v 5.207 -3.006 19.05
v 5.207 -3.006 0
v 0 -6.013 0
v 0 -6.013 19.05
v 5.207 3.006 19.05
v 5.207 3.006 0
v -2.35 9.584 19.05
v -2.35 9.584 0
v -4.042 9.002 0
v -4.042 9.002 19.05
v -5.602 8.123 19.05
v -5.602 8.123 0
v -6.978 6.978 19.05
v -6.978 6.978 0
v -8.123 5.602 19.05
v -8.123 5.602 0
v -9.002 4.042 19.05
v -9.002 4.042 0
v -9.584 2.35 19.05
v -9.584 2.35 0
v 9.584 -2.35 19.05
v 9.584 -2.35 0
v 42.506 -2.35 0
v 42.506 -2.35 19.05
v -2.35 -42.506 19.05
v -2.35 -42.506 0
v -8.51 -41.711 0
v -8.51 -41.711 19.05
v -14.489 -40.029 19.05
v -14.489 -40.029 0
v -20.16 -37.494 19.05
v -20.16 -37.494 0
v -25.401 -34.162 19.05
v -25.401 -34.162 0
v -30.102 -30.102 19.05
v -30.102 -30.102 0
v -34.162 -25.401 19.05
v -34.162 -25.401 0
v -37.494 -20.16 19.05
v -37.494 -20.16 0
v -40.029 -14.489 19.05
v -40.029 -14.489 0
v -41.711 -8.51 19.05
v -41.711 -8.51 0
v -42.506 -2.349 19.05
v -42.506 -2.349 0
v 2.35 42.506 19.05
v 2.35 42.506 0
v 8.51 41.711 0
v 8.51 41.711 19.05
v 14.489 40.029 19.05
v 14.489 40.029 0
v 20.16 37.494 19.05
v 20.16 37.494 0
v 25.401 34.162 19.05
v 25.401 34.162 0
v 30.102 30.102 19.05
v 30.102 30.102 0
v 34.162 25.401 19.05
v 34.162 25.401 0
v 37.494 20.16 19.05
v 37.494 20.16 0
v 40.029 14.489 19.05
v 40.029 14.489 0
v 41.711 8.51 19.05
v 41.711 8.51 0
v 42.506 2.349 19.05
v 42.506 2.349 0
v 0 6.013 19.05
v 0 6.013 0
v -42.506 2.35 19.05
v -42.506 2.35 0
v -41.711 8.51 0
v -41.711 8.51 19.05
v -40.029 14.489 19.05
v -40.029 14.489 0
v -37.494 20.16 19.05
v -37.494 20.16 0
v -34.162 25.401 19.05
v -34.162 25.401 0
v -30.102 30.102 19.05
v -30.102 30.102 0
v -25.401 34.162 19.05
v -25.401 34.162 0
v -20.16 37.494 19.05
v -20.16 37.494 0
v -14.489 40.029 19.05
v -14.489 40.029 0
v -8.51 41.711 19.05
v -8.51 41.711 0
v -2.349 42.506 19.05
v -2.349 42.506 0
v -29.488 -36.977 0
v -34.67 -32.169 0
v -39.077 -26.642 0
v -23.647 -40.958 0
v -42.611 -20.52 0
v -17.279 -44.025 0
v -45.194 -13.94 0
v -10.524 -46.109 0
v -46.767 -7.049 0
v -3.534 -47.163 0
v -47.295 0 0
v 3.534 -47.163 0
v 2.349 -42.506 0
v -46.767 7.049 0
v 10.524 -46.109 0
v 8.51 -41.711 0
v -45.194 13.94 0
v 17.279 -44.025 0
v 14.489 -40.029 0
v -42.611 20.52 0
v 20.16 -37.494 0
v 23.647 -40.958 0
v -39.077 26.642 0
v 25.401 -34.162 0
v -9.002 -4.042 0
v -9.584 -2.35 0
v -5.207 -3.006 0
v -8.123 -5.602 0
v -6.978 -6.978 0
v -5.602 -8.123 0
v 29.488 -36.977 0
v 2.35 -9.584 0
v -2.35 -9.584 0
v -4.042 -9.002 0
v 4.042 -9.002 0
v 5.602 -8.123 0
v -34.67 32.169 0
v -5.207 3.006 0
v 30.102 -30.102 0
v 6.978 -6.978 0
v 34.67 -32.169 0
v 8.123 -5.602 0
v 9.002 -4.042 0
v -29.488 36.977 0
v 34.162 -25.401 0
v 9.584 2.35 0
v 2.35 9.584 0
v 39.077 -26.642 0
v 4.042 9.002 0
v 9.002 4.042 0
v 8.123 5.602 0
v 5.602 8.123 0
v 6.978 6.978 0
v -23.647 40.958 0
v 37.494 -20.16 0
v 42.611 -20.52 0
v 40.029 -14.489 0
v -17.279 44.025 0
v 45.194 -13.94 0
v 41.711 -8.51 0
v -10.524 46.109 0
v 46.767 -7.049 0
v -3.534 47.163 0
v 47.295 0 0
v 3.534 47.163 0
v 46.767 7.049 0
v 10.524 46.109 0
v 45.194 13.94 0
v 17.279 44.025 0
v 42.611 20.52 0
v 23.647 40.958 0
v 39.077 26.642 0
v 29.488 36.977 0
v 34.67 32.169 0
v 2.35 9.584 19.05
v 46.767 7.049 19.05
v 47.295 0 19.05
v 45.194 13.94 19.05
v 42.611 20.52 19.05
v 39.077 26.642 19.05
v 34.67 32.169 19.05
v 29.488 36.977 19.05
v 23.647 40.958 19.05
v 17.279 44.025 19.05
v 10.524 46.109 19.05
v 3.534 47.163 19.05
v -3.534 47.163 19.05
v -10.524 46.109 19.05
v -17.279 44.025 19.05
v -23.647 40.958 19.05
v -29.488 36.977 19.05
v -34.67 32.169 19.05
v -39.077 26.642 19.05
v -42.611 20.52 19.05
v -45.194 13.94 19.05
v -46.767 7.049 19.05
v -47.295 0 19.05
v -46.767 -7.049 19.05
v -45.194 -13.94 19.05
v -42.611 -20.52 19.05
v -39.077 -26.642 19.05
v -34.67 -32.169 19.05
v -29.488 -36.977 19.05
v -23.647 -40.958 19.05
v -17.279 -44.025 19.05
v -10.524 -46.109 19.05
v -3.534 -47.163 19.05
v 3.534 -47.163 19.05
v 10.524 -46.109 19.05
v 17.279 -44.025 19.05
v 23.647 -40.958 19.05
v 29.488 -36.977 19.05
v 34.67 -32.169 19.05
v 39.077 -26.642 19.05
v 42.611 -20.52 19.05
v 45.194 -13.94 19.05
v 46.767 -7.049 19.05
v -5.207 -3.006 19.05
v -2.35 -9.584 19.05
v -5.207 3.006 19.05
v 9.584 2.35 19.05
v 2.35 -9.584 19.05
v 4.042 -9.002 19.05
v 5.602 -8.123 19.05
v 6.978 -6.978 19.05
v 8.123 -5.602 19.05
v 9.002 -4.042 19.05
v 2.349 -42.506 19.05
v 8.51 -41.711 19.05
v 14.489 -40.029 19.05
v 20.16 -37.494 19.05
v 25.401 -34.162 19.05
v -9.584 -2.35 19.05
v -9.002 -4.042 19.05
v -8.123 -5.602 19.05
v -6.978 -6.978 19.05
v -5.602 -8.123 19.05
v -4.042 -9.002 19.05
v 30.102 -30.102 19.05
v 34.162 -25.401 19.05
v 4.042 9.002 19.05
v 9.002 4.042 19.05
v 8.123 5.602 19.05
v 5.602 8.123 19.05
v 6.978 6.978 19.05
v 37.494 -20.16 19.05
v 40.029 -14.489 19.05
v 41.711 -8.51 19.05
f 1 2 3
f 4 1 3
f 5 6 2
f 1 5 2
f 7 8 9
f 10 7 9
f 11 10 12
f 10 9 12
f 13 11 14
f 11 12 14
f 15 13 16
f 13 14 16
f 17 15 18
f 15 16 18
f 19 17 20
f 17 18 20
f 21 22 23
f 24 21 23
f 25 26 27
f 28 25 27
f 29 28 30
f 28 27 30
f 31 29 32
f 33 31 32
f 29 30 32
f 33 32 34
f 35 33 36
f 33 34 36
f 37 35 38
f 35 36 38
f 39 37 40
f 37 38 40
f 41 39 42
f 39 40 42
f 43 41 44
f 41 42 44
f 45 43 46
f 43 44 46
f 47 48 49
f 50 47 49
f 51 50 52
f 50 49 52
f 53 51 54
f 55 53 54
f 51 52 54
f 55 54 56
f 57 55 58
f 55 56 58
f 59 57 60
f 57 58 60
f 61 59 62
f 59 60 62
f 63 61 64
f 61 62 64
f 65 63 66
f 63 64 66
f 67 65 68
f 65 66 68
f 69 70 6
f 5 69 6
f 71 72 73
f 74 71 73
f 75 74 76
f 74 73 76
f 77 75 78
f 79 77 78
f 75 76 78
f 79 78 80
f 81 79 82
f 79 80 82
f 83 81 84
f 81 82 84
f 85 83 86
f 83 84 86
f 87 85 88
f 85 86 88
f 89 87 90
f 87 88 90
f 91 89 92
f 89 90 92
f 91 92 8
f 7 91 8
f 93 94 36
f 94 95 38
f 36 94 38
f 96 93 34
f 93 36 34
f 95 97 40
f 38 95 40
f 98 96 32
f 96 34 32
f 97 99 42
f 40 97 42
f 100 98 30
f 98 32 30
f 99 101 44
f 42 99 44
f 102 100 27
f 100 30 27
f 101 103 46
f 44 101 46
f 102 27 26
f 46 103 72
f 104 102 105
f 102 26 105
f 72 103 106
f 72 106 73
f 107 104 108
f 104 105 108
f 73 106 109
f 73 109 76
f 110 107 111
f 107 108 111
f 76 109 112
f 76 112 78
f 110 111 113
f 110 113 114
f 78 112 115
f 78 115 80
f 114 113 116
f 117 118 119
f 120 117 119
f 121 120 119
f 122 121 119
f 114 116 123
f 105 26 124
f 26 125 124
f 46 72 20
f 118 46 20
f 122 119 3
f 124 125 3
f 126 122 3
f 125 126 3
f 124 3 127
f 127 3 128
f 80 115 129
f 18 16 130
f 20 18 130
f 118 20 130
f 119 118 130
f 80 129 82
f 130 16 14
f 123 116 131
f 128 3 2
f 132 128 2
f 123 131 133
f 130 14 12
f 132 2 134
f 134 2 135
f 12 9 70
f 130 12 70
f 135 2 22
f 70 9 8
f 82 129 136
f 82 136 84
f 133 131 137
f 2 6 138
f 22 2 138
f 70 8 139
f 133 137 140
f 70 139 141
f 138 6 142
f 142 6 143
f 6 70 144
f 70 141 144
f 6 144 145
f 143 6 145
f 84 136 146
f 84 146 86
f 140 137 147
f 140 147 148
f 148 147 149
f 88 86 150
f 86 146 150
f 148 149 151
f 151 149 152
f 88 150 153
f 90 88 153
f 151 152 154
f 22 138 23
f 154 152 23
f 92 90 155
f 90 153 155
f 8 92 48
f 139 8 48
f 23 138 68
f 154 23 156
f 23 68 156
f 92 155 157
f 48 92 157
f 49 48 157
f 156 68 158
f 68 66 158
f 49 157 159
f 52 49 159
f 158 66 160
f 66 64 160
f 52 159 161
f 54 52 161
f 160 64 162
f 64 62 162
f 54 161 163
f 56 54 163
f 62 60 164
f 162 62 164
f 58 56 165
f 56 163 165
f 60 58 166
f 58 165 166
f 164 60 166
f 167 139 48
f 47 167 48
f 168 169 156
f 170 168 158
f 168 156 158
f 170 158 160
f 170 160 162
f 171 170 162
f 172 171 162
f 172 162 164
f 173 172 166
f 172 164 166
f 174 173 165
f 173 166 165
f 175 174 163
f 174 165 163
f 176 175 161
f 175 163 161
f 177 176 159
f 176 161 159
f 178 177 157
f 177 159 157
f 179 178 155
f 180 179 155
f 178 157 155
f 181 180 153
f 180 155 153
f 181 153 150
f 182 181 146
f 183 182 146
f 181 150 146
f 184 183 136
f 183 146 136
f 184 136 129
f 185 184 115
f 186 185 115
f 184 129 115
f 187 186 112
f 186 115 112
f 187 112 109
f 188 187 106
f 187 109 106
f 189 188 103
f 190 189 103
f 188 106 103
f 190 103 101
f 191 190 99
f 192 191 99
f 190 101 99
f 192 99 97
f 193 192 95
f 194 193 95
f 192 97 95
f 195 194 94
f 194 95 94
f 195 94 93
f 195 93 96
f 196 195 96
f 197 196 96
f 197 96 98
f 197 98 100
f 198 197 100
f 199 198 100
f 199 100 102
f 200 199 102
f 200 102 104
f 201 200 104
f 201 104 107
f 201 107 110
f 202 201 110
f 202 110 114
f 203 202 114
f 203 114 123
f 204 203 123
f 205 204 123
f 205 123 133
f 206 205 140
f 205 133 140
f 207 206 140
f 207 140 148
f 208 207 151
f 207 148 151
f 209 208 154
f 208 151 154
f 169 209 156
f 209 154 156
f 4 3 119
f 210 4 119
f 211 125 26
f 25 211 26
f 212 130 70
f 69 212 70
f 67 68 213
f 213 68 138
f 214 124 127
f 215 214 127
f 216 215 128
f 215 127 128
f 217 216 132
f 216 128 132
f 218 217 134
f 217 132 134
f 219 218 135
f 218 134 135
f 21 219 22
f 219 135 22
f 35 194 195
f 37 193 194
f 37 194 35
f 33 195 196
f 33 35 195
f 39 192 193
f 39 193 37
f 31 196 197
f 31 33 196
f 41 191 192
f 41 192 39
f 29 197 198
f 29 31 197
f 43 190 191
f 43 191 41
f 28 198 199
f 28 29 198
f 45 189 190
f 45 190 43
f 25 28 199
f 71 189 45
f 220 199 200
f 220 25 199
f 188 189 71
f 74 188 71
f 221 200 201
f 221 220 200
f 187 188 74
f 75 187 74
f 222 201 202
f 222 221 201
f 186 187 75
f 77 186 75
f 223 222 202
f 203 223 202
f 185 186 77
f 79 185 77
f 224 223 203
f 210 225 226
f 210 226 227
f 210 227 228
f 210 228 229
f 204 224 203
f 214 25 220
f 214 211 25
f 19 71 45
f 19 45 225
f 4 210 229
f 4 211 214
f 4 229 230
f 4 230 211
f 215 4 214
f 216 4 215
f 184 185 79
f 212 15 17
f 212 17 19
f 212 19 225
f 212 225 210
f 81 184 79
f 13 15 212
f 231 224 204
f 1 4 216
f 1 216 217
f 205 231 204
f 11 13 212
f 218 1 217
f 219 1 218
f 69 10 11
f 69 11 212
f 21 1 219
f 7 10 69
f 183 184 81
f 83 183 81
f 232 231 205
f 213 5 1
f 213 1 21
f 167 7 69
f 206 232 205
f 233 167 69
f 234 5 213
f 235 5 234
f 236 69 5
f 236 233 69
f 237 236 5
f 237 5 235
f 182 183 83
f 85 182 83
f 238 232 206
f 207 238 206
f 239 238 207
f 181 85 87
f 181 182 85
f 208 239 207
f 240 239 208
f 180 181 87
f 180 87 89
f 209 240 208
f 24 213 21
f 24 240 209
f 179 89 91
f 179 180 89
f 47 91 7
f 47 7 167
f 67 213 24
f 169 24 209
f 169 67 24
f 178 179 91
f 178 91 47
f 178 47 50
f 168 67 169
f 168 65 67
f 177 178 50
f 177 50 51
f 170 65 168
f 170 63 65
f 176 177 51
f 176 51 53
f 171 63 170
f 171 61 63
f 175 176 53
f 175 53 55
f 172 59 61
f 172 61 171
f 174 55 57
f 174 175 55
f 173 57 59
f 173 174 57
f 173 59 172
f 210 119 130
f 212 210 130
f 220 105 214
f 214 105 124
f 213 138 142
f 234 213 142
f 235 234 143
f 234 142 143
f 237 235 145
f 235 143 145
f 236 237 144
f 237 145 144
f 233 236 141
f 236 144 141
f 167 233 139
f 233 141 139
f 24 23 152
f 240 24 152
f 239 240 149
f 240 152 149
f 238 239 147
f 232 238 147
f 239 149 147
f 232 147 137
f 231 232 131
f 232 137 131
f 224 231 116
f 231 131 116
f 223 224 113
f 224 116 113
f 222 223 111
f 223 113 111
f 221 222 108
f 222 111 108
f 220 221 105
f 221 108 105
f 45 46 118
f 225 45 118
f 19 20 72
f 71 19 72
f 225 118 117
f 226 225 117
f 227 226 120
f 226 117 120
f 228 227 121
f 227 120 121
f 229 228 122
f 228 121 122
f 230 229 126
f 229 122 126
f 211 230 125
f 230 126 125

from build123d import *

# Parameters (mm, degrees)
F0_R     = 47.2948
F1_DEPTH = 19.05


with BuildPart() as f1:
    # F0 (on Top) → F1 (new body)
    with BuildSketch(Plane.XY):
        Circle(F0_R)
        with BuildLine():
            ThreePointArc((42.505515, 2.3495), (42.554176, 1.175198), (42.5704, 0))
            ThreePointArc((42.5704, 0), (42.554176, -1.175198), (42.505515, -2.3495))
            ThreePointArc((42.505515, -2.3495), (30.101819, -30.101819), (2.3495, -42.505515))
            ThreePointArc((2.3495, -42.505515), (0, -42.5704), (-2.3495, -42.505515))
            ThreePointArc((-2.3495, -42.505515), (-30.101819, -30.101819), (-42.505515, -2.3495))
            ThreePointArc((-42.505515, -2.3495), (-42.5704, 0), (-42.505515, 2.3495))
            ThreePointArc((-42.505515, 2.3495), (-30.101819, 30.101819), (-2.3495, 42.505515))
            ThreePointArc((-2.3495, 42.505515), (0, 42.5704), (2.3495, 42.505515))
            ThreePointArc((2.3495, 42.505515), (30.101819, 30.101819), (42.505515, 2.3495))
        make_face(mode=Mode.SUBTRACT)
        with BuildLine():
            Line((2.3495, 9.584117), (2.3495, 42.505515))
            ThreePointArc((2.3495, 42.505515), (0, 42.5704), (-2.3495, 42.505515))
            Line((-2.3495, 42.505515), (-2.3495, 9.584117))
            ThreePointArc((-2.3495, 9.584117), (0, 9.8679), (2.3495, 9.584117))
        make_face()
        with BuildLine():
            ThreePointArc((9.8679, 0), (9.796697, 1.183288), (9.584117, 2.3495))
            ThreePointArc((9.584117, 2.3495), (6.977659, 6.977659), (2.3495, 9.584117))
            ThreePointArc((2.3495, 9.584117), (0, 9.8679), (-2.3495, 9.584117))
            ThreePointArc((-2.3495, 9.584117), (-6.977659, 6.977659), (-9.584117, 2.3495))
            ThreePointArc((-9.584117, 2.3495), (-9.8679, 0), (-9.584117, -2.3495))
            ThreePointArc((-9.584117, -2.3495), (-6.977659, -6.977659), (-2.3495, -9.584117))
            ThreePointArc((-2.3495, -9.584117), (0, -9.8679), (2.3495, -9.584117))
            ThreePointArc((2.3495, -9.584117), (6.977659, -6.977659), (9.584117, -2.3495))
            ThreePointArc((9.584117, -2.3495), (9.796697, -1.183288), (9.8679, 0))
        make_face()
        Polygon((-5.207, 3.006263), (0, 6.012526), (5.207, 3.006263), (5.207, -3.006263), (0, -6.012526), (-5.207, -3.006263), align=None, mode=Mode.SUBTRACT)
        with BuildLine():
            Line((-9.584117, 2.3495), (-42.505515, 2.3495))
            ThreePointArc((-42.505515, 2.3495), (-42.5704, 0), (-42.505515, -2.3495))
            Line((-42.505515, -2.3495), (-9.584117, -2.3495))
            ThreePointArc((-9.584117, -2.3495), (-9.8679, 0), (-9.584117, 2.3495))
        make_face()
        with BuildLine():
            ThreePointArc((-2.3495, -42.505515), (0, -42.5704), (2.3495, -42.505515))
            Line((2.3495, -42.505515), (2.3495, -9.584117))
            ThreePointArc((2.3495, -9.584117), (0, -9.8679), (-2.3495, -9.584117))
            Line((-2.3495, -9.584117), (-2.3495, -42.505515))
        make_face()
        with BuildLine():
            ThreePointArc((42.505515, -2.3495), (42.554176, -1.175198), (42.5704, 0))
            ThreePointArc((42.5704, 0), (42.554176, 1.175198), (42.505515, 2.3495))
            Line((42.505515, 2.3495), (9.584117, 2.3495))
            ThreePointArc((9.584117, 2.3495), (9.796697, 1.183288), (9.8679, 0))
            ThreePointArc((9.8679, 0), (9.796697, -1.183288), (9.584117, -2.3495))
            Line((9.584117, -2.3495), (42.505515, -2.3495))
        make_face()
    extrude(amount=F1_DEPTH)


solid = f1.part
